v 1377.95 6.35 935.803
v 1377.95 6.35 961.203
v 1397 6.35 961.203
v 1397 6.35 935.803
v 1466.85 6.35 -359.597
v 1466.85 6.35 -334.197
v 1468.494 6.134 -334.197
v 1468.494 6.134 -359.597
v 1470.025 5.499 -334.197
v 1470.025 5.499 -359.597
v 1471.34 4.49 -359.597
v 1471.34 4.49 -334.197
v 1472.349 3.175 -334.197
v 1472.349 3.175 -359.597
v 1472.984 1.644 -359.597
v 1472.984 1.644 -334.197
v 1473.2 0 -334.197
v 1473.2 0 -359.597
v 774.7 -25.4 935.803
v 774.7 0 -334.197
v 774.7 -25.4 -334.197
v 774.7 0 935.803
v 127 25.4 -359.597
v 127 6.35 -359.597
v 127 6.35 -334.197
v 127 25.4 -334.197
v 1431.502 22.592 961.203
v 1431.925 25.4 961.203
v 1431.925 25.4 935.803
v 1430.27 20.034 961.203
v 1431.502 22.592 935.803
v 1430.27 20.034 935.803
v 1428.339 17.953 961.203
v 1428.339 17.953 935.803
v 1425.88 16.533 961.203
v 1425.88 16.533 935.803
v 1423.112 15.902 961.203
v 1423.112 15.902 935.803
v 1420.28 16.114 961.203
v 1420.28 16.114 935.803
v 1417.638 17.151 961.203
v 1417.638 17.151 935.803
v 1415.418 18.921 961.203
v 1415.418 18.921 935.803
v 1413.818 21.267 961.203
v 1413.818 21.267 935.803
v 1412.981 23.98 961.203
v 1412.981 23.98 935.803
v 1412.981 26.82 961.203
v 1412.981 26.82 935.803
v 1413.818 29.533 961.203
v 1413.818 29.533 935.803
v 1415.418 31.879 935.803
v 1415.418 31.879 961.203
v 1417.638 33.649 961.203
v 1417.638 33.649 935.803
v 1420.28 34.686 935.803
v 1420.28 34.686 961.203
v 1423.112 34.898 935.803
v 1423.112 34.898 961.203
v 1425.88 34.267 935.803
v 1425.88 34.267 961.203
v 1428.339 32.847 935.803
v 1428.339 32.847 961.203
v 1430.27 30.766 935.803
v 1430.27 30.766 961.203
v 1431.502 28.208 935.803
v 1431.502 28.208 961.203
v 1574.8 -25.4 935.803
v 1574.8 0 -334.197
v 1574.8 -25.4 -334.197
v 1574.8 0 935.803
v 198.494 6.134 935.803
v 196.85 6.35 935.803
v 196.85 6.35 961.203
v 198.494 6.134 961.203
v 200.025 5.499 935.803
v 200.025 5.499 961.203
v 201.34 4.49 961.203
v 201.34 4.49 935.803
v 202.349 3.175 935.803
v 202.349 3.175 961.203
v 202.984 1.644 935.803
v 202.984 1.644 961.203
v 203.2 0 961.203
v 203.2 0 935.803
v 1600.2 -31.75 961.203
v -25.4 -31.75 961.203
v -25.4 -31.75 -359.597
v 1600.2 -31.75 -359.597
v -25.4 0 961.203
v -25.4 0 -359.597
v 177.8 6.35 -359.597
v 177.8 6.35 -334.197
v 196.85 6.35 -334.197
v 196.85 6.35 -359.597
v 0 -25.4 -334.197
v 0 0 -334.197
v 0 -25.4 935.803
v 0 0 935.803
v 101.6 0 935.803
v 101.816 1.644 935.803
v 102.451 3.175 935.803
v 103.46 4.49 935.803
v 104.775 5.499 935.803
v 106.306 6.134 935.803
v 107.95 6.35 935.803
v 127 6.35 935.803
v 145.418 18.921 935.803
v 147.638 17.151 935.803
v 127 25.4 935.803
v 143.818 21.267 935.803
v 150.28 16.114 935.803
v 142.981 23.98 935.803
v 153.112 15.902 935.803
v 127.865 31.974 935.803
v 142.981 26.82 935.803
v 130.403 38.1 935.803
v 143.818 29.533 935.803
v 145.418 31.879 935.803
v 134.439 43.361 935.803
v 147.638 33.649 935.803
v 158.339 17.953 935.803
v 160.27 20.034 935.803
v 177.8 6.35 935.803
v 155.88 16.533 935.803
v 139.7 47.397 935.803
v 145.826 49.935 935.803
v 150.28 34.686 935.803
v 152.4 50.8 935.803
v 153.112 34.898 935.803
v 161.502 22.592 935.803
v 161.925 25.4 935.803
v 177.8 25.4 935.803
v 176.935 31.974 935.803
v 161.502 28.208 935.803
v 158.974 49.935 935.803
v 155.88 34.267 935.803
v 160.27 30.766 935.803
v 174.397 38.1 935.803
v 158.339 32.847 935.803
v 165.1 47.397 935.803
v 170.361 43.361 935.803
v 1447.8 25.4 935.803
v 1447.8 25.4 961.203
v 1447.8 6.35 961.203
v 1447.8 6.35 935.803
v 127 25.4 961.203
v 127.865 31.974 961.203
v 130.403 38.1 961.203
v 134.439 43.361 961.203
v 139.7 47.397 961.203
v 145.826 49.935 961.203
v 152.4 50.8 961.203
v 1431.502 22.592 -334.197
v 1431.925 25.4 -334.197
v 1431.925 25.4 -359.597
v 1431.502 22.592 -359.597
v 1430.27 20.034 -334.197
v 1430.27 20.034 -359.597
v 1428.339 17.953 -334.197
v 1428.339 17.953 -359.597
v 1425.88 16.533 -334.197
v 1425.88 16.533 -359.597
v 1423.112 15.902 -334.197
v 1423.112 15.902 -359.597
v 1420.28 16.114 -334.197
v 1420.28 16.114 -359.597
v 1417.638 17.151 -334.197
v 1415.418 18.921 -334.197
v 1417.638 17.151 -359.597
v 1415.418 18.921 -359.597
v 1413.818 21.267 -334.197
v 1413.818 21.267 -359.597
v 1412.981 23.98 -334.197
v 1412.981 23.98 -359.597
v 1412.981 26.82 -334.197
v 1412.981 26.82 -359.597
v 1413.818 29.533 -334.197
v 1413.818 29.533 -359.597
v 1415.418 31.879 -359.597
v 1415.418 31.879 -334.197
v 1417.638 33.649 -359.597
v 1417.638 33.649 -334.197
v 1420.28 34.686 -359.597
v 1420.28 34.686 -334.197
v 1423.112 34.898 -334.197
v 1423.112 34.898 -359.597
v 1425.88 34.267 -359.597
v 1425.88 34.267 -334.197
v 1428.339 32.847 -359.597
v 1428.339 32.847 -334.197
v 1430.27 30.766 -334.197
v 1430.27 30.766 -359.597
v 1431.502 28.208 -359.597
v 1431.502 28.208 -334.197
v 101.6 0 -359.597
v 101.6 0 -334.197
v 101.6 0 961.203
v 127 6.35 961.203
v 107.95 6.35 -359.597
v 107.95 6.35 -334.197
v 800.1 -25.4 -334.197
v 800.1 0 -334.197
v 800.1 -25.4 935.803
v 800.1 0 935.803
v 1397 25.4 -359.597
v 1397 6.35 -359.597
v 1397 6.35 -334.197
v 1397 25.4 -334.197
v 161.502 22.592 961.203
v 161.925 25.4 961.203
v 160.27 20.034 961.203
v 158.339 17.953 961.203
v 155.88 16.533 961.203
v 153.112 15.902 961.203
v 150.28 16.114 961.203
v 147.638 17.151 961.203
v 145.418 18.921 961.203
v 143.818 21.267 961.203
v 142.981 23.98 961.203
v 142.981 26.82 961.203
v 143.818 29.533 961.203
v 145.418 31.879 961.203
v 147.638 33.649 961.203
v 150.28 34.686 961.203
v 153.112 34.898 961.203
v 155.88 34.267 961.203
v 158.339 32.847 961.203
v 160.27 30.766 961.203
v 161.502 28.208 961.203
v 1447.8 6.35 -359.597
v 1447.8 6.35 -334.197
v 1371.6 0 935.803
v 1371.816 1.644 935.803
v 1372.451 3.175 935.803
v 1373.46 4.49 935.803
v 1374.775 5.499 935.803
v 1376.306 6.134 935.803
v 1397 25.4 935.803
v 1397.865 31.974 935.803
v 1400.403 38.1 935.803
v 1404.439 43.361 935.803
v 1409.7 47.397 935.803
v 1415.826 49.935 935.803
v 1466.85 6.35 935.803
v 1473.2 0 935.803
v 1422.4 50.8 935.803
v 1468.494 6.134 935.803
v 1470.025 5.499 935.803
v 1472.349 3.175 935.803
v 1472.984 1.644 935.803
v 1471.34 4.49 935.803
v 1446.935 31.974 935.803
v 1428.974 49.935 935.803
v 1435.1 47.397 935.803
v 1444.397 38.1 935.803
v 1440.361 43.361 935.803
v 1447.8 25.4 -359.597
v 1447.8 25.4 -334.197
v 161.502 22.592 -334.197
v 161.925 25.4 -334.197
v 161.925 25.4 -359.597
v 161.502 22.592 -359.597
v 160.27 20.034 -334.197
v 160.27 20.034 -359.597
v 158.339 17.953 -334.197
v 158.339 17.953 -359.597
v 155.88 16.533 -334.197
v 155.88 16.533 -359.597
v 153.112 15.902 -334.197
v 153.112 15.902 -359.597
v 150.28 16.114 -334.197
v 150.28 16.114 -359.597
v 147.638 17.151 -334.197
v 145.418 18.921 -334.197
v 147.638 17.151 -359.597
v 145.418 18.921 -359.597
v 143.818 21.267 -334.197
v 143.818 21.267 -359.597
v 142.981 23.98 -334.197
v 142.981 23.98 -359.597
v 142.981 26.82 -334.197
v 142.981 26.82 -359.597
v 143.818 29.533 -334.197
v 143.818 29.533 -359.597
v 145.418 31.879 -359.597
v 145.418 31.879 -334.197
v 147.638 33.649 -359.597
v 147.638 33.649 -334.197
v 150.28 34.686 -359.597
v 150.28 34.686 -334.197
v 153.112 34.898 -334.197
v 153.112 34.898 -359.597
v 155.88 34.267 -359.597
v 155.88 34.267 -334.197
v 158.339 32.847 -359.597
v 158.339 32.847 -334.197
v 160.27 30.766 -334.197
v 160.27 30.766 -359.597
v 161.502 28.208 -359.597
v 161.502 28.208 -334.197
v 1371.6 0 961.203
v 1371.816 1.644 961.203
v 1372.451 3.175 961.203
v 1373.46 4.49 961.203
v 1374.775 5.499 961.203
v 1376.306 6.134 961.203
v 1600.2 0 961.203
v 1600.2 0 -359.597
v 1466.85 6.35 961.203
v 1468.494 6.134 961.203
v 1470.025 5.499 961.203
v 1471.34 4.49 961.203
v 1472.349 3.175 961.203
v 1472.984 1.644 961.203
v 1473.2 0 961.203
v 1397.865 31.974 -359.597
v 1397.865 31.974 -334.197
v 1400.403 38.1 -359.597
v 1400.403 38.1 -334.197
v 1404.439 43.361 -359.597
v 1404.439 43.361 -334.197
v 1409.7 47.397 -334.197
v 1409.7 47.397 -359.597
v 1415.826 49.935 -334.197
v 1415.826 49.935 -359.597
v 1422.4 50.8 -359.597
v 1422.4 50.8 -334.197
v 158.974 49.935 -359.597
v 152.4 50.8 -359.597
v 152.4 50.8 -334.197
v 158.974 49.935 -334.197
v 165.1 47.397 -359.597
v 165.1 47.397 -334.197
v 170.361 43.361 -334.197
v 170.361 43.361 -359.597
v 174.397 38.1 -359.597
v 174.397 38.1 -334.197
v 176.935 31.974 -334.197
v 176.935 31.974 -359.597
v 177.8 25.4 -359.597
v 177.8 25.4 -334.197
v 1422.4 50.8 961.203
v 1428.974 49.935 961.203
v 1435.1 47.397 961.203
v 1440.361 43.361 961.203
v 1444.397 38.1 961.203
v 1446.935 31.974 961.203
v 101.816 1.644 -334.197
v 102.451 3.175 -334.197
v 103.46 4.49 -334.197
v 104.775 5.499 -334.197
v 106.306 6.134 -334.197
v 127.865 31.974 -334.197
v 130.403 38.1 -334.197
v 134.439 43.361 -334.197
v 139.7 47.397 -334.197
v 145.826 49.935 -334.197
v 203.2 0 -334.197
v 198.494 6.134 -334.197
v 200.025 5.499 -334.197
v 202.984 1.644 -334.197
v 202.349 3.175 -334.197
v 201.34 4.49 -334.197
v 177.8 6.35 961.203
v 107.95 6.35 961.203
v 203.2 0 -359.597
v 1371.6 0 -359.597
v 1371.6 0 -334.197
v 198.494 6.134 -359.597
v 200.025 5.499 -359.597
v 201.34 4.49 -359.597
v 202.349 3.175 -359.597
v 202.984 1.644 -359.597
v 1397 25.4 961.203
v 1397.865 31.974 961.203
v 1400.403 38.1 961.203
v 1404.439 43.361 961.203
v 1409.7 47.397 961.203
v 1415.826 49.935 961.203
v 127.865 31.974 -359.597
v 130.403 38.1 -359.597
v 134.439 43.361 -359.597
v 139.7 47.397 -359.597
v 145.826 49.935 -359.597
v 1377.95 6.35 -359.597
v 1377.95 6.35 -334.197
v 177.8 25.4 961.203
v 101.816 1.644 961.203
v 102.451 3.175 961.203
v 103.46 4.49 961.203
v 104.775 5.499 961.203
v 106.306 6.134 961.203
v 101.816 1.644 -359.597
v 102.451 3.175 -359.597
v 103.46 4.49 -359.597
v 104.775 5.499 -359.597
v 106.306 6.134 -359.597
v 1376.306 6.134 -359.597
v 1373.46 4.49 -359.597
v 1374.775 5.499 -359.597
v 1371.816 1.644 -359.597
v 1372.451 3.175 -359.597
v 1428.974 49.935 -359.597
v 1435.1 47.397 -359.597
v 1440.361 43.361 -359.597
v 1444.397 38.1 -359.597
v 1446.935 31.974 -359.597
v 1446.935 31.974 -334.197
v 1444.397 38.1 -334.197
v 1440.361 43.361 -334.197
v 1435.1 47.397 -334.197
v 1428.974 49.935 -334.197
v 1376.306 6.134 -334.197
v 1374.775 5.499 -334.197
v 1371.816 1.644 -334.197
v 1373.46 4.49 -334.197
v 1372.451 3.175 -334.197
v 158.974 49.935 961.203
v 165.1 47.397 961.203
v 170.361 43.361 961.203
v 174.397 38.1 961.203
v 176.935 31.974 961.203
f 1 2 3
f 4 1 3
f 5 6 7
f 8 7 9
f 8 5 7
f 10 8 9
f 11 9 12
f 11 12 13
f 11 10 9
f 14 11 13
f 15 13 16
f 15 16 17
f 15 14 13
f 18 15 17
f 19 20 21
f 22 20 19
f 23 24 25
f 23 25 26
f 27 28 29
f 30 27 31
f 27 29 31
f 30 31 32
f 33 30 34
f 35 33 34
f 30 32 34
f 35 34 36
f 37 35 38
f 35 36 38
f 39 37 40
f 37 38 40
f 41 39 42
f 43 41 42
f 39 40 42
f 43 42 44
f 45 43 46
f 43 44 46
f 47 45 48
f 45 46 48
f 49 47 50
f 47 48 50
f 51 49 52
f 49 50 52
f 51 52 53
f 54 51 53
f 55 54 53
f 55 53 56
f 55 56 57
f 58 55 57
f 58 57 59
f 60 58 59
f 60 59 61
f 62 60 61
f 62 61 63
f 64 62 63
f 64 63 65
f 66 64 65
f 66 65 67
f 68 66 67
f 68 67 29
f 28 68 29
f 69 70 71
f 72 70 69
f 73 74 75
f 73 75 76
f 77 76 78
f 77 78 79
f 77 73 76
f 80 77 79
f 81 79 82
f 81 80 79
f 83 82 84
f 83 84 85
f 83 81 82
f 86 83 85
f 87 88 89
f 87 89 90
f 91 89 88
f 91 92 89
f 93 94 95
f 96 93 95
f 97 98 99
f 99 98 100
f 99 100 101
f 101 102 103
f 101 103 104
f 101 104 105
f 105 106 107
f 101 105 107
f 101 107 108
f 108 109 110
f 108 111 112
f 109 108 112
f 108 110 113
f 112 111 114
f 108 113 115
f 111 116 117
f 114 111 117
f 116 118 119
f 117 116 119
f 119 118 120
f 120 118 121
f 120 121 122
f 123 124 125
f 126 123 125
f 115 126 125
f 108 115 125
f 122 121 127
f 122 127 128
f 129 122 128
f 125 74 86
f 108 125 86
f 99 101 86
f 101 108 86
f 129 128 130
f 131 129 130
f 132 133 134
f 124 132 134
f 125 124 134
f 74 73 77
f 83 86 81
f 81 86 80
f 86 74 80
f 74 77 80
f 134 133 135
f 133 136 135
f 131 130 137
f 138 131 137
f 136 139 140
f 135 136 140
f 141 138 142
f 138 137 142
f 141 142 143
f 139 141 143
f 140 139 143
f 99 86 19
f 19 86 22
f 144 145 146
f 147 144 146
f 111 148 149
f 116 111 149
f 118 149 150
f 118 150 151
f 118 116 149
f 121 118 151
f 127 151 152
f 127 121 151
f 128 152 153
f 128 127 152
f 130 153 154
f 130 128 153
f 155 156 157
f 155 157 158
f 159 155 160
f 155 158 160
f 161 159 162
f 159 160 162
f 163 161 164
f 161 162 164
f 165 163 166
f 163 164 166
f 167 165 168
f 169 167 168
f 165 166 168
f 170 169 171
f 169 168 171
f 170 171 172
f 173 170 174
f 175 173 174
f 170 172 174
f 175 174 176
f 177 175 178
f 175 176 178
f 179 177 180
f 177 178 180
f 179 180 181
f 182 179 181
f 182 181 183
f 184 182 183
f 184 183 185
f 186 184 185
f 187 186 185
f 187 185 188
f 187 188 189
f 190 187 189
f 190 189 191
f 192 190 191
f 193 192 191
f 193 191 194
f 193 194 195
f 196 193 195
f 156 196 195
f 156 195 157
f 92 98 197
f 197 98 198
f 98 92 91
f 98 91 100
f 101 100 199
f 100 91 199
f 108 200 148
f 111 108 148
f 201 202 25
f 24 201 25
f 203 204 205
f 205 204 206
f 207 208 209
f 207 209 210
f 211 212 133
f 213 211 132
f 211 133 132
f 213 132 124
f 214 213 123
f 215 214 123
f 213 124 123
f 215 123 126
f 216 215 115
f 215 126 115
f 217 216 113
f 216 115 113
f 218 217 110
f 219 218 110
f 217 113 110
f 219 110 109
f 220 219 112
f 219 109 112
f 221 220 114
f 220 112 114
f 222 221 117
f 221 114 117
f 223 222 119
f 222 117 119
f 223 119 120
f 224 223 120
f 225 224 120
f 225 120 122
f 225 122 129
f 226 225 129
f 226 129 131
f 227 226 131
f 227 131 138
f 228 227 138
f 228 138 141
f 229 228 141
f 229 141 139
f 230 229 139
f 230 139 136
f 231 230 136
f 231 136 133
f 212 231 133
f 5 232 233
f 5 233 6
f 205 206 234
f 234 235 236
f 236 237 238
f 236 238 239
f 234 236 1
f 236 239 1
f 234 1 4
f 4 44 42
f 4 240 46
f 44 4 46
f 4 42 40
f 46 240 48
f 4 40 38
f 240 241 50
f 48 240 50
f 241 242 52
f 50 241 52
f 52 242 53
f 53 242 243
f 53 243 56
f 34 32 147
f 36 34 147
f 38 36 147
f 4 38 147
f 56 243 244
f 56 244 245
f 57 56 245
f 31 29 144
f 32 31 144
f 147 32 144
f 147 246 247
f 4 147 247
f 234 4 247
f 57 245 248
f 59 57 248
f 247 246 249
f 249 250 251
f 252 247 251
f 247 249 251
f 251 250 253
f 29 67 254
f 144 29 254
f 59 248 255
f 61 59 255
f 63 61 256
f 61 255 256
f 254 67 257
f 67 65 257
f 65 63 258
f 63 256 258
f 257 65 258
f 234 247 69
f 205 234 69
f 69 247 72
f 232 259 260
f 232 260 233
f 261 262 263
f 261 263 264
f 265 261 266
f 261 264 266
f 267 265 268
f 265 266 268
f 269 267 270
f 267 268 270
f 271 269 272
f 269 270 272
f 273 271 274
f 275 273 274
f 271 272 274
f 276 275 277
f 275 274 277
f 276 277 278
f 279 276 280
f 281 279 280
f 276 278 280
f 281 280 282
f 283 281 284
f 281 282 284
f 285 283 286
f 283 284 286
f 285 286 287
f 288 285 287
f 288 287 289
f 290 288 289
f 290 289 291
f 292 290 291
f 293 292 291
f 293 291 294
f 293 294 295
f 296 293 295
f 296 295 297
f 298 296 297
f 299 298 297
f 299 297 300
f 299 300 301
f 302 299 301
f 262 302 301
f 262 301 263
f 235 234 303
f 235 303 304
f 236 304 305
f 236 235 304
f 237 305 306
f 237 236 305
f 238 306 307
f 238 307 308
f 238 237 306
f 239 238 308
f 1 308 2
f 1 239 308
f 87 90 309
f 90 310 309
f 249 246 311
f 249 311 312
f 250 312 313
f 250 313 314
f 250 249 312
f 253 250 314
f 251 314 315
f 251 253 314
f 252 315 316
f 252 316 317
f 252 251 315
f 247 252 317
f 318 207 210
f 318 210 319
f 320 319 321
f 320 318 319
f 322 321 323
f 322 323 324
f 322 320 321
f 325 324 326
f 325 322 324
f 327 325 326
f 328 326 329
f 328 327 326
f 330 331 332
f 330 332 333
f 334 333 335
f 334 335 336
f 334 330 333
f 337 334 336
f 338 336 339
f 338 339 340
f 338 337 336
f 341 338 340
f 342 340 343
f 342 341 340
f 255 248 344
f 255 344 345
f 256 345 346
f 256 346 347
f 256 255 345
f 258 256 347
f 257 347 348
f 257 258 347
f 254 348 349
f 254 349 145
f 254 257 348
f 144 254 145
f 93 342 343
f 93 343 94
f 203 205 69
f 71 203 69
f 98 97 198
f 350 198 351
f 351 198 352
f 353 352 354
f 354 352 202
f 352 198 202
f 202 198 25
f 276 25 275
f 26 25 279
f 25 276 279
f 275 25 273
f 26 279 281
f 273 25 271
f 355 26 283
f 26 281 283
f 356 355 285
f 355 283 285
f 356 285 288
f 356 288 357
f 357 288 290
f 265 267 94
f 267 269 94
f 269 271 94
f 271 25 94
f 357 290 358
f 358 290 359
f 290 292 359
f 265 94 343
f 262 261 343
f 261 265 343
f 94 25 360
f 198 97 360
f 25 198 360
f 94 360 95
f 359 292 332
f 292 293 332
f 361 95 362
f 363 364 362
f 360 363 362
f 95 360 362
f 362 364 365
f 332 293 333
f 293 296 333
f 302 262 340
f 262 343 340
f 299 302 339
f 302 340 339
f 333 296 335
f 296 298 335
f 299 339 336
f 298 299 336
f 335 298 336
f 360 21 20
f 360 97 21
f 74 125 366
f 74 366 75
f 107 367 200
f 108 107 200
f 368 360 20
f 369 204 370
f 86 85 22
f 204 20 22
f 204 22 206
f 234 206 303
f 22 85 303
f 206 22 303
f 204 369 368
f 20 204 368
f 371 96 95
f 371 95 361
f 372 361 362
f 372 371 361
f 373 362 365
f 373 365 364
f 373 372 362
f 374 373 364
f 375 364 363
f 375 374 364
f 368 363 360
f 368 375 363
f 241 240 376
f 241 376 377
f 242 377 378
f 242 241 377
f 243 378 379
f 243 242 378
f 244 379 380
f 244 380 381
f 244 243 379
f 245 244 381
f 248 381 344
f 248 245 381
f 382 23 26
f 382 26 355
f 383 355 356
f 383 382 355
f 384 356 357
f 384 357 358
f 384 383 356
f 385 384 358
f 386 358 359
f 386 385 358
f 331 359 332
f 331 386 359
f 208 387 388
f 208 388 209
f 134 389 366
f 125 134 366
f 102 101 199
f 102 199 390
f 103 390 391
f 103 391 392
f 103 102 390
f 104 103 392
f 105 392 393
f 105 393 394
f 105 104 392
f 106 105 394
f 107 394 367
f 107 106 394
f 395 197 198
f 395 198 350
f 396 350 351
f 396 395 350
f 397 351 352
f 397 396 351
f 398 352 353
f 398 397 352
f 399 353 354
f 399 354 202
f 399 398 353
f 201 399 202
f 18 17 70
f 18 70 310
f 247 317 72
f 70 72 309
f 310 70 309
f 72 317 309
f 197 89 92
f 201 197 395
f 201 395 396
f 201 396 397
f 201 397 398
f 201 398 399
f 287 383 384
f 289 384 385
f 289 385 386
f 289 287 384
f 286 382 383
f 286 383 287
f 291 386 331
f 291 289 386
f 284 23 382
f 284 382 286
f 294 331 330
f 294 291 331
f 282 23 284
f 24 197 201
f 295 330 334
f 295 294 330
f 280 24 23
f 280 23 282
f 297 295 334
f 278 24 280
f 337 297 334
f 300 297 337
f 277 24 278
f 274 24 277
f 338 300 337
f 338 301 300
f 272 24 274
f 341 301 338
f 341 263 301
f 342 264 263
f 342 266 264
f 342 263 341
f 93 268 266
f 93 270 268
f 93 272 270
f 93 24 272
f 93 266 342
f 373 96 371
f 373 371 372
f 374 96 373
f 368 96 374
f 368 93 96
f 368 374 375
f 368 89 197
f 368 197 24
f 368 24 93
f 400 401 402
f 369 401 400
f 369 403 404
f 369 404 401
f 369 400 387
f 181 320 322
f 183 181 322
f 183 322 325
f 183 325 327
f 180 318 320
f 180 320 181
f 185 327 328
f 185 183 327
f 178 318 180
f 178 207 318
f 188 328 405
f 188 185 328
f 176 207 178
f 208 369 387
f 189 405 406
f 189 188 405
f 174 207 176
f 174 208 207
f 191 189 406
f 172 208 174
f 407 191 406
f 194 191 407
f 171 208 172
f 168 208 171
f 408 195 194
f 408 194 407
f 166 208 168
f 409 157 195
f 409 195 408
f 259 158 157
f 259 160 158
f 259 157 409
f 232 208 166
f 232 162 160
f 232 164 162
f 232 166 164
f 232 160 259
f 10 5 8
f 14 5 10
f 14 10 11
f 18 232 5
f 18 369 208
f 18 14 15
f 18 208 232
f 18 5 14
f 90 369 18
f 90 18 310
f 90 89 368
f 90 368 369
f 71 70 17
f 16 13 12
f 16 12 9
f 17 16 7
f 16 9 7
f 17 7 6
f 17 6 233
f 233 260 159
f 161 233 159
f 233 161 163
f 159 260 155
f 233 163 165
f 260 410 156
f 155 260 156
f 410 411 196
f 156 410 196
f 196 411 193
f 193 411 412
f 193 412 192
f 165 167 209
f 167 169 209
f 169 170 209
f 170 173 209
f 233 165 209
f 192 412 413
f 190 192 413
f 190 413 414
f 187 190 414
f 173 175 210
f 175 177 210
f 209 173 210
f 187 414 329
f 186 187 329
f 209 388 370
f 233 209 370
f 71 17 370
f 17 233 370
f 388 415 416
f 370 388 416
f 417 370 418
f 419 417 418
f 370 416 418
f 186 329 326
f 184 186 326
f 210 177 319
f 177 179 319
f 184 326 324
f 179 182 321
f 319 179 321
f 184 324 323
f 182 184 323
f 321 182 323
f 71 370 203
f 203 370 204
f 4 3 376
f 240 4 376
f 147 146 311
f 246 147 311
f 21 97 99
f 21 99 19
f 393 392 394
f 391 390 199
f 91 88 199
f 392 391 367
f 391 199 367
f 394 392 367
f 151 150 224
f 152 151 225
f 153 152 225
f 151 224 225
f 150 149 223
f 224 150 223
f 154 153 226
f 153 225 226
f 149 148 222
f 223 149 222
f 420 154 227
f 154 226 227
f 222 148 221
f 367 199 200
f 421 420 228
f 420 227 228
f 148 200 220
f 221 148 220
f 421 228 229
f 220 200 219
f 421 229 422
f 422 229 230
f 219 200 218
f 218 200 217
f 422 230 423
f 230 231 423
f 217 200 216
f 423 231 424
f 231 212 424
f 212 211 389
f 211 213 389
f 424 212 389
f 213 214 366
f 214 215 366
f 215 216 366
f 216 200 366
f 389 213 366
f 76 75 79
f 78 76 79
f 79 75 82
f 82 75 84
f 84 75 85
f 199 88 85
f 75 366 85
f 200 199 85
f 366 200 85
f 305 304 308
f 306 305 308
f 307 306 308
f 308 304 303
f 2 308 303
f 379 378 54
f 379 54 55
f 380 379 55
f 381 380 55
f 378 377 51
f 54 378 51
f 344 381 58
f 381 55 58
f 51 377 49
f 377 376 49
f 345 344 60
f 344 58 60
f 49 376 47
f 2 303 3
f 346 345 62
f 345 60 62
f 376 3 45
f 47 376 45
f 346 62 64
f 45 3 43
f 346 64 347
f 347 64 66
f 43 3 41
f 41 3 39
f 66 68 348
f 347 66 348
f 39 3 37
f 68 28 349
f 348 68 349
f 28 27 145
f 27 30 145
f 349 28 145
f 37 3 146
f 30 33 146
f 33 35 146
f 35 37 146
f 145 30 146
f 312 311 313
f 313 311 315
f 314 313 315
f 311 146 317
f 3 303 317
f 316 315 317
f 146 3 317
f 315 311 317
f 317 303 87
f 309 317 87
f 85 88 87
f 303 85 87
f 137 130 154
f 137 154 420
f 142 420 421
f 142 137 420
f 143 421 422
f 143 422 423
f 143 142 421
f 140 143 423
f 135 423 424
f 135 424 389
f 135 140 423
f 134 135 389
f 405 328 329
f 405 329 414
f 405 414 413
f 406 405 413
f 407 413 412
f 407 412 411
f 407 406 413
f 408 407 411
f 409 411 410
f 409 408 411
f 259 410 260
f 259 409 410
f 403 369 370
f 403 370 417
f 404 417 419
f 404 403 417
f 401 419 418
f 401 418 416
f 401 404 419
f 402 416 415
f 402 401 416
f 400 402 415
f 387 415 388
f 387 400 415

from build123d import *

# Parameters (mm, degrees)
F0_W     = 25.4
F0_H     = 1270
F1_DEPTH = 25.4
F2_W     = 1625.6
F2_H     = 1320.8
F3_DEPTH = 6.35
F4_R     = 9.525
F5_DEPTH = 1320.8
F6_W     = 50.8
F6_H     = 1270
F7_DEPTH = 1625.601


with BuildPart() as f1:
    # F0 (on Front) → F1 (new body)
    with BuildSketch(Plane.XZ):
        with Locations((787.4, 300.803003)):
            Rectangle(F0_W, F0_H)
        Polygon((1600.2, 961.203003), (-25.4, 961.203003), (-25.4, 935.803003), (0, 935.803003), (774.7, 935.803003), (800.1, 935.803003), (1574.8, 935.803003), (1600.2, 935.803003), align=None)
        with Locations((-12.7, 300.803003)):
            Rectangle(F0_W, F0_H)
        Polygon((0, -334.196997), (-25.4, -334.196997), (-25.4, -359.596997), (1600.2, -359.596997), (1600.2, -334.196997), (1574.8, -334.196997), (800.1, -334.196997), (774.7, -334.196997), align=None)
        with Locations((1587.5, 300.803003)):
            Rectangle(F0_W, F0_H)
    extrude(amount=F1_DEPTH)

    # F2 (on face) → F3 (join)
    with BuildSketch(Plane.XZ.offset(25.4)):
        with Locations((787.4, 300.803003)):
            Rectangle(F2_W, F2_H)
    extrude(amount=F3_DEPTH)

    # F4 (on face) → F5 (join)
    with BuildSketch(Plane(origin=(0, 0, -359.596997), x_dir=(1, 0, 0), z_dir=(0, 0, -1))):
        with BuildLine():
            Line((177.8, 0), (127, 0))
            Line((127, 0), (127, -6.35))
            Line((127, -6.35), (127, -25.4))
            ThreePointArc((127, -25.4), (134.439488, -43.360512), (152.4, -50.8))
            ThreePointArc((152.4, -50.8), (170.360512, -43.360512), (177.8, -25.4))
            Line((177.8, -25.4), (177.8, -6.35))
            Line((177.8, -6.35), (177.8, 0))
        make_face()
        with Locations((152.4, -25.4)):
            Circle(F4_R, mode=Mode.SUBTRACT)
        with BuildLine():
            Line((127, -6.35), (127, 0))
            Line((127, 0), (101.6, 0))
            ThreePointArc((101.6, 0), (103.459872, -4.490128), (107.95, -6.35))
            Line((107.95, -6.35), (127, -6.35))
        make_face()
        with BuildLine():
            Line((203.2, 0), (177.8, 0))
            Line((177.8, 0), (177.8, -6.35))
            Line((177.8, -6.35), (196.85, -6.35))
            ThreePointArc((196.85, -6.35), (201.340128, -4.490128), (203.2, 0))
        make_face()
        with BuildLine():
            Line((1447.8, -6.35), (1447.8, 0))
            Line((1447.8, 0), (1397, 0))
            Line((1397, 0), (1397, -6.35))
            Line((1397, -6.35), (1397, -25.4))
            ThreePointArc((1397, -25.4), (1404.439488, -43.360512), (1422.4, -50.8))
            ThreePointArc((1422.4, -50.8), (1440.360512, -43.360512), (1447.8, -25.4))
            Line((1447.8, -25.4), (1447.8, -6.35))
        make_face()
        with Locations((1422.4, -25.4)):
            Circle(F4_R, mode=Mode.SUBTRACT)
        with BuildLine():
            Line((1473.2, 0), (1447.8, 0))
            Line((1447.8, 0), (1447.8, -6.35))
            Line((1447.8, -6.35), (1466.85, -6.35))
            ThreePointArc((1466.85, -6.35), (1471.340128, -4.490128), (1473.2, 0))
        make_face()
        with BuildLine():
            Line((1397, -6.35), (1397, 0))
            Line((1397, 0), (1371.6, 0))
            ThreePointArc((1371.6, 0), (1373.459872, -4.490128), (1377.95, -6.35))
            Line((1377.95, -6.35), (1397, -6.35))
        make_face()
    extrude(amount=-F5_DEPTH)

    # F6 (on face) → F7 (cut, through all)
    with BuildSketch(Plane.YZ.offset(1600.2)):
        with Locations((25.4, 300.803003)):
            Rectangle(F6_W, F6_H)
    extrude(amount=-F7_DEPTH, mode=Mode.SUBTRACT)


solid = f1.part
